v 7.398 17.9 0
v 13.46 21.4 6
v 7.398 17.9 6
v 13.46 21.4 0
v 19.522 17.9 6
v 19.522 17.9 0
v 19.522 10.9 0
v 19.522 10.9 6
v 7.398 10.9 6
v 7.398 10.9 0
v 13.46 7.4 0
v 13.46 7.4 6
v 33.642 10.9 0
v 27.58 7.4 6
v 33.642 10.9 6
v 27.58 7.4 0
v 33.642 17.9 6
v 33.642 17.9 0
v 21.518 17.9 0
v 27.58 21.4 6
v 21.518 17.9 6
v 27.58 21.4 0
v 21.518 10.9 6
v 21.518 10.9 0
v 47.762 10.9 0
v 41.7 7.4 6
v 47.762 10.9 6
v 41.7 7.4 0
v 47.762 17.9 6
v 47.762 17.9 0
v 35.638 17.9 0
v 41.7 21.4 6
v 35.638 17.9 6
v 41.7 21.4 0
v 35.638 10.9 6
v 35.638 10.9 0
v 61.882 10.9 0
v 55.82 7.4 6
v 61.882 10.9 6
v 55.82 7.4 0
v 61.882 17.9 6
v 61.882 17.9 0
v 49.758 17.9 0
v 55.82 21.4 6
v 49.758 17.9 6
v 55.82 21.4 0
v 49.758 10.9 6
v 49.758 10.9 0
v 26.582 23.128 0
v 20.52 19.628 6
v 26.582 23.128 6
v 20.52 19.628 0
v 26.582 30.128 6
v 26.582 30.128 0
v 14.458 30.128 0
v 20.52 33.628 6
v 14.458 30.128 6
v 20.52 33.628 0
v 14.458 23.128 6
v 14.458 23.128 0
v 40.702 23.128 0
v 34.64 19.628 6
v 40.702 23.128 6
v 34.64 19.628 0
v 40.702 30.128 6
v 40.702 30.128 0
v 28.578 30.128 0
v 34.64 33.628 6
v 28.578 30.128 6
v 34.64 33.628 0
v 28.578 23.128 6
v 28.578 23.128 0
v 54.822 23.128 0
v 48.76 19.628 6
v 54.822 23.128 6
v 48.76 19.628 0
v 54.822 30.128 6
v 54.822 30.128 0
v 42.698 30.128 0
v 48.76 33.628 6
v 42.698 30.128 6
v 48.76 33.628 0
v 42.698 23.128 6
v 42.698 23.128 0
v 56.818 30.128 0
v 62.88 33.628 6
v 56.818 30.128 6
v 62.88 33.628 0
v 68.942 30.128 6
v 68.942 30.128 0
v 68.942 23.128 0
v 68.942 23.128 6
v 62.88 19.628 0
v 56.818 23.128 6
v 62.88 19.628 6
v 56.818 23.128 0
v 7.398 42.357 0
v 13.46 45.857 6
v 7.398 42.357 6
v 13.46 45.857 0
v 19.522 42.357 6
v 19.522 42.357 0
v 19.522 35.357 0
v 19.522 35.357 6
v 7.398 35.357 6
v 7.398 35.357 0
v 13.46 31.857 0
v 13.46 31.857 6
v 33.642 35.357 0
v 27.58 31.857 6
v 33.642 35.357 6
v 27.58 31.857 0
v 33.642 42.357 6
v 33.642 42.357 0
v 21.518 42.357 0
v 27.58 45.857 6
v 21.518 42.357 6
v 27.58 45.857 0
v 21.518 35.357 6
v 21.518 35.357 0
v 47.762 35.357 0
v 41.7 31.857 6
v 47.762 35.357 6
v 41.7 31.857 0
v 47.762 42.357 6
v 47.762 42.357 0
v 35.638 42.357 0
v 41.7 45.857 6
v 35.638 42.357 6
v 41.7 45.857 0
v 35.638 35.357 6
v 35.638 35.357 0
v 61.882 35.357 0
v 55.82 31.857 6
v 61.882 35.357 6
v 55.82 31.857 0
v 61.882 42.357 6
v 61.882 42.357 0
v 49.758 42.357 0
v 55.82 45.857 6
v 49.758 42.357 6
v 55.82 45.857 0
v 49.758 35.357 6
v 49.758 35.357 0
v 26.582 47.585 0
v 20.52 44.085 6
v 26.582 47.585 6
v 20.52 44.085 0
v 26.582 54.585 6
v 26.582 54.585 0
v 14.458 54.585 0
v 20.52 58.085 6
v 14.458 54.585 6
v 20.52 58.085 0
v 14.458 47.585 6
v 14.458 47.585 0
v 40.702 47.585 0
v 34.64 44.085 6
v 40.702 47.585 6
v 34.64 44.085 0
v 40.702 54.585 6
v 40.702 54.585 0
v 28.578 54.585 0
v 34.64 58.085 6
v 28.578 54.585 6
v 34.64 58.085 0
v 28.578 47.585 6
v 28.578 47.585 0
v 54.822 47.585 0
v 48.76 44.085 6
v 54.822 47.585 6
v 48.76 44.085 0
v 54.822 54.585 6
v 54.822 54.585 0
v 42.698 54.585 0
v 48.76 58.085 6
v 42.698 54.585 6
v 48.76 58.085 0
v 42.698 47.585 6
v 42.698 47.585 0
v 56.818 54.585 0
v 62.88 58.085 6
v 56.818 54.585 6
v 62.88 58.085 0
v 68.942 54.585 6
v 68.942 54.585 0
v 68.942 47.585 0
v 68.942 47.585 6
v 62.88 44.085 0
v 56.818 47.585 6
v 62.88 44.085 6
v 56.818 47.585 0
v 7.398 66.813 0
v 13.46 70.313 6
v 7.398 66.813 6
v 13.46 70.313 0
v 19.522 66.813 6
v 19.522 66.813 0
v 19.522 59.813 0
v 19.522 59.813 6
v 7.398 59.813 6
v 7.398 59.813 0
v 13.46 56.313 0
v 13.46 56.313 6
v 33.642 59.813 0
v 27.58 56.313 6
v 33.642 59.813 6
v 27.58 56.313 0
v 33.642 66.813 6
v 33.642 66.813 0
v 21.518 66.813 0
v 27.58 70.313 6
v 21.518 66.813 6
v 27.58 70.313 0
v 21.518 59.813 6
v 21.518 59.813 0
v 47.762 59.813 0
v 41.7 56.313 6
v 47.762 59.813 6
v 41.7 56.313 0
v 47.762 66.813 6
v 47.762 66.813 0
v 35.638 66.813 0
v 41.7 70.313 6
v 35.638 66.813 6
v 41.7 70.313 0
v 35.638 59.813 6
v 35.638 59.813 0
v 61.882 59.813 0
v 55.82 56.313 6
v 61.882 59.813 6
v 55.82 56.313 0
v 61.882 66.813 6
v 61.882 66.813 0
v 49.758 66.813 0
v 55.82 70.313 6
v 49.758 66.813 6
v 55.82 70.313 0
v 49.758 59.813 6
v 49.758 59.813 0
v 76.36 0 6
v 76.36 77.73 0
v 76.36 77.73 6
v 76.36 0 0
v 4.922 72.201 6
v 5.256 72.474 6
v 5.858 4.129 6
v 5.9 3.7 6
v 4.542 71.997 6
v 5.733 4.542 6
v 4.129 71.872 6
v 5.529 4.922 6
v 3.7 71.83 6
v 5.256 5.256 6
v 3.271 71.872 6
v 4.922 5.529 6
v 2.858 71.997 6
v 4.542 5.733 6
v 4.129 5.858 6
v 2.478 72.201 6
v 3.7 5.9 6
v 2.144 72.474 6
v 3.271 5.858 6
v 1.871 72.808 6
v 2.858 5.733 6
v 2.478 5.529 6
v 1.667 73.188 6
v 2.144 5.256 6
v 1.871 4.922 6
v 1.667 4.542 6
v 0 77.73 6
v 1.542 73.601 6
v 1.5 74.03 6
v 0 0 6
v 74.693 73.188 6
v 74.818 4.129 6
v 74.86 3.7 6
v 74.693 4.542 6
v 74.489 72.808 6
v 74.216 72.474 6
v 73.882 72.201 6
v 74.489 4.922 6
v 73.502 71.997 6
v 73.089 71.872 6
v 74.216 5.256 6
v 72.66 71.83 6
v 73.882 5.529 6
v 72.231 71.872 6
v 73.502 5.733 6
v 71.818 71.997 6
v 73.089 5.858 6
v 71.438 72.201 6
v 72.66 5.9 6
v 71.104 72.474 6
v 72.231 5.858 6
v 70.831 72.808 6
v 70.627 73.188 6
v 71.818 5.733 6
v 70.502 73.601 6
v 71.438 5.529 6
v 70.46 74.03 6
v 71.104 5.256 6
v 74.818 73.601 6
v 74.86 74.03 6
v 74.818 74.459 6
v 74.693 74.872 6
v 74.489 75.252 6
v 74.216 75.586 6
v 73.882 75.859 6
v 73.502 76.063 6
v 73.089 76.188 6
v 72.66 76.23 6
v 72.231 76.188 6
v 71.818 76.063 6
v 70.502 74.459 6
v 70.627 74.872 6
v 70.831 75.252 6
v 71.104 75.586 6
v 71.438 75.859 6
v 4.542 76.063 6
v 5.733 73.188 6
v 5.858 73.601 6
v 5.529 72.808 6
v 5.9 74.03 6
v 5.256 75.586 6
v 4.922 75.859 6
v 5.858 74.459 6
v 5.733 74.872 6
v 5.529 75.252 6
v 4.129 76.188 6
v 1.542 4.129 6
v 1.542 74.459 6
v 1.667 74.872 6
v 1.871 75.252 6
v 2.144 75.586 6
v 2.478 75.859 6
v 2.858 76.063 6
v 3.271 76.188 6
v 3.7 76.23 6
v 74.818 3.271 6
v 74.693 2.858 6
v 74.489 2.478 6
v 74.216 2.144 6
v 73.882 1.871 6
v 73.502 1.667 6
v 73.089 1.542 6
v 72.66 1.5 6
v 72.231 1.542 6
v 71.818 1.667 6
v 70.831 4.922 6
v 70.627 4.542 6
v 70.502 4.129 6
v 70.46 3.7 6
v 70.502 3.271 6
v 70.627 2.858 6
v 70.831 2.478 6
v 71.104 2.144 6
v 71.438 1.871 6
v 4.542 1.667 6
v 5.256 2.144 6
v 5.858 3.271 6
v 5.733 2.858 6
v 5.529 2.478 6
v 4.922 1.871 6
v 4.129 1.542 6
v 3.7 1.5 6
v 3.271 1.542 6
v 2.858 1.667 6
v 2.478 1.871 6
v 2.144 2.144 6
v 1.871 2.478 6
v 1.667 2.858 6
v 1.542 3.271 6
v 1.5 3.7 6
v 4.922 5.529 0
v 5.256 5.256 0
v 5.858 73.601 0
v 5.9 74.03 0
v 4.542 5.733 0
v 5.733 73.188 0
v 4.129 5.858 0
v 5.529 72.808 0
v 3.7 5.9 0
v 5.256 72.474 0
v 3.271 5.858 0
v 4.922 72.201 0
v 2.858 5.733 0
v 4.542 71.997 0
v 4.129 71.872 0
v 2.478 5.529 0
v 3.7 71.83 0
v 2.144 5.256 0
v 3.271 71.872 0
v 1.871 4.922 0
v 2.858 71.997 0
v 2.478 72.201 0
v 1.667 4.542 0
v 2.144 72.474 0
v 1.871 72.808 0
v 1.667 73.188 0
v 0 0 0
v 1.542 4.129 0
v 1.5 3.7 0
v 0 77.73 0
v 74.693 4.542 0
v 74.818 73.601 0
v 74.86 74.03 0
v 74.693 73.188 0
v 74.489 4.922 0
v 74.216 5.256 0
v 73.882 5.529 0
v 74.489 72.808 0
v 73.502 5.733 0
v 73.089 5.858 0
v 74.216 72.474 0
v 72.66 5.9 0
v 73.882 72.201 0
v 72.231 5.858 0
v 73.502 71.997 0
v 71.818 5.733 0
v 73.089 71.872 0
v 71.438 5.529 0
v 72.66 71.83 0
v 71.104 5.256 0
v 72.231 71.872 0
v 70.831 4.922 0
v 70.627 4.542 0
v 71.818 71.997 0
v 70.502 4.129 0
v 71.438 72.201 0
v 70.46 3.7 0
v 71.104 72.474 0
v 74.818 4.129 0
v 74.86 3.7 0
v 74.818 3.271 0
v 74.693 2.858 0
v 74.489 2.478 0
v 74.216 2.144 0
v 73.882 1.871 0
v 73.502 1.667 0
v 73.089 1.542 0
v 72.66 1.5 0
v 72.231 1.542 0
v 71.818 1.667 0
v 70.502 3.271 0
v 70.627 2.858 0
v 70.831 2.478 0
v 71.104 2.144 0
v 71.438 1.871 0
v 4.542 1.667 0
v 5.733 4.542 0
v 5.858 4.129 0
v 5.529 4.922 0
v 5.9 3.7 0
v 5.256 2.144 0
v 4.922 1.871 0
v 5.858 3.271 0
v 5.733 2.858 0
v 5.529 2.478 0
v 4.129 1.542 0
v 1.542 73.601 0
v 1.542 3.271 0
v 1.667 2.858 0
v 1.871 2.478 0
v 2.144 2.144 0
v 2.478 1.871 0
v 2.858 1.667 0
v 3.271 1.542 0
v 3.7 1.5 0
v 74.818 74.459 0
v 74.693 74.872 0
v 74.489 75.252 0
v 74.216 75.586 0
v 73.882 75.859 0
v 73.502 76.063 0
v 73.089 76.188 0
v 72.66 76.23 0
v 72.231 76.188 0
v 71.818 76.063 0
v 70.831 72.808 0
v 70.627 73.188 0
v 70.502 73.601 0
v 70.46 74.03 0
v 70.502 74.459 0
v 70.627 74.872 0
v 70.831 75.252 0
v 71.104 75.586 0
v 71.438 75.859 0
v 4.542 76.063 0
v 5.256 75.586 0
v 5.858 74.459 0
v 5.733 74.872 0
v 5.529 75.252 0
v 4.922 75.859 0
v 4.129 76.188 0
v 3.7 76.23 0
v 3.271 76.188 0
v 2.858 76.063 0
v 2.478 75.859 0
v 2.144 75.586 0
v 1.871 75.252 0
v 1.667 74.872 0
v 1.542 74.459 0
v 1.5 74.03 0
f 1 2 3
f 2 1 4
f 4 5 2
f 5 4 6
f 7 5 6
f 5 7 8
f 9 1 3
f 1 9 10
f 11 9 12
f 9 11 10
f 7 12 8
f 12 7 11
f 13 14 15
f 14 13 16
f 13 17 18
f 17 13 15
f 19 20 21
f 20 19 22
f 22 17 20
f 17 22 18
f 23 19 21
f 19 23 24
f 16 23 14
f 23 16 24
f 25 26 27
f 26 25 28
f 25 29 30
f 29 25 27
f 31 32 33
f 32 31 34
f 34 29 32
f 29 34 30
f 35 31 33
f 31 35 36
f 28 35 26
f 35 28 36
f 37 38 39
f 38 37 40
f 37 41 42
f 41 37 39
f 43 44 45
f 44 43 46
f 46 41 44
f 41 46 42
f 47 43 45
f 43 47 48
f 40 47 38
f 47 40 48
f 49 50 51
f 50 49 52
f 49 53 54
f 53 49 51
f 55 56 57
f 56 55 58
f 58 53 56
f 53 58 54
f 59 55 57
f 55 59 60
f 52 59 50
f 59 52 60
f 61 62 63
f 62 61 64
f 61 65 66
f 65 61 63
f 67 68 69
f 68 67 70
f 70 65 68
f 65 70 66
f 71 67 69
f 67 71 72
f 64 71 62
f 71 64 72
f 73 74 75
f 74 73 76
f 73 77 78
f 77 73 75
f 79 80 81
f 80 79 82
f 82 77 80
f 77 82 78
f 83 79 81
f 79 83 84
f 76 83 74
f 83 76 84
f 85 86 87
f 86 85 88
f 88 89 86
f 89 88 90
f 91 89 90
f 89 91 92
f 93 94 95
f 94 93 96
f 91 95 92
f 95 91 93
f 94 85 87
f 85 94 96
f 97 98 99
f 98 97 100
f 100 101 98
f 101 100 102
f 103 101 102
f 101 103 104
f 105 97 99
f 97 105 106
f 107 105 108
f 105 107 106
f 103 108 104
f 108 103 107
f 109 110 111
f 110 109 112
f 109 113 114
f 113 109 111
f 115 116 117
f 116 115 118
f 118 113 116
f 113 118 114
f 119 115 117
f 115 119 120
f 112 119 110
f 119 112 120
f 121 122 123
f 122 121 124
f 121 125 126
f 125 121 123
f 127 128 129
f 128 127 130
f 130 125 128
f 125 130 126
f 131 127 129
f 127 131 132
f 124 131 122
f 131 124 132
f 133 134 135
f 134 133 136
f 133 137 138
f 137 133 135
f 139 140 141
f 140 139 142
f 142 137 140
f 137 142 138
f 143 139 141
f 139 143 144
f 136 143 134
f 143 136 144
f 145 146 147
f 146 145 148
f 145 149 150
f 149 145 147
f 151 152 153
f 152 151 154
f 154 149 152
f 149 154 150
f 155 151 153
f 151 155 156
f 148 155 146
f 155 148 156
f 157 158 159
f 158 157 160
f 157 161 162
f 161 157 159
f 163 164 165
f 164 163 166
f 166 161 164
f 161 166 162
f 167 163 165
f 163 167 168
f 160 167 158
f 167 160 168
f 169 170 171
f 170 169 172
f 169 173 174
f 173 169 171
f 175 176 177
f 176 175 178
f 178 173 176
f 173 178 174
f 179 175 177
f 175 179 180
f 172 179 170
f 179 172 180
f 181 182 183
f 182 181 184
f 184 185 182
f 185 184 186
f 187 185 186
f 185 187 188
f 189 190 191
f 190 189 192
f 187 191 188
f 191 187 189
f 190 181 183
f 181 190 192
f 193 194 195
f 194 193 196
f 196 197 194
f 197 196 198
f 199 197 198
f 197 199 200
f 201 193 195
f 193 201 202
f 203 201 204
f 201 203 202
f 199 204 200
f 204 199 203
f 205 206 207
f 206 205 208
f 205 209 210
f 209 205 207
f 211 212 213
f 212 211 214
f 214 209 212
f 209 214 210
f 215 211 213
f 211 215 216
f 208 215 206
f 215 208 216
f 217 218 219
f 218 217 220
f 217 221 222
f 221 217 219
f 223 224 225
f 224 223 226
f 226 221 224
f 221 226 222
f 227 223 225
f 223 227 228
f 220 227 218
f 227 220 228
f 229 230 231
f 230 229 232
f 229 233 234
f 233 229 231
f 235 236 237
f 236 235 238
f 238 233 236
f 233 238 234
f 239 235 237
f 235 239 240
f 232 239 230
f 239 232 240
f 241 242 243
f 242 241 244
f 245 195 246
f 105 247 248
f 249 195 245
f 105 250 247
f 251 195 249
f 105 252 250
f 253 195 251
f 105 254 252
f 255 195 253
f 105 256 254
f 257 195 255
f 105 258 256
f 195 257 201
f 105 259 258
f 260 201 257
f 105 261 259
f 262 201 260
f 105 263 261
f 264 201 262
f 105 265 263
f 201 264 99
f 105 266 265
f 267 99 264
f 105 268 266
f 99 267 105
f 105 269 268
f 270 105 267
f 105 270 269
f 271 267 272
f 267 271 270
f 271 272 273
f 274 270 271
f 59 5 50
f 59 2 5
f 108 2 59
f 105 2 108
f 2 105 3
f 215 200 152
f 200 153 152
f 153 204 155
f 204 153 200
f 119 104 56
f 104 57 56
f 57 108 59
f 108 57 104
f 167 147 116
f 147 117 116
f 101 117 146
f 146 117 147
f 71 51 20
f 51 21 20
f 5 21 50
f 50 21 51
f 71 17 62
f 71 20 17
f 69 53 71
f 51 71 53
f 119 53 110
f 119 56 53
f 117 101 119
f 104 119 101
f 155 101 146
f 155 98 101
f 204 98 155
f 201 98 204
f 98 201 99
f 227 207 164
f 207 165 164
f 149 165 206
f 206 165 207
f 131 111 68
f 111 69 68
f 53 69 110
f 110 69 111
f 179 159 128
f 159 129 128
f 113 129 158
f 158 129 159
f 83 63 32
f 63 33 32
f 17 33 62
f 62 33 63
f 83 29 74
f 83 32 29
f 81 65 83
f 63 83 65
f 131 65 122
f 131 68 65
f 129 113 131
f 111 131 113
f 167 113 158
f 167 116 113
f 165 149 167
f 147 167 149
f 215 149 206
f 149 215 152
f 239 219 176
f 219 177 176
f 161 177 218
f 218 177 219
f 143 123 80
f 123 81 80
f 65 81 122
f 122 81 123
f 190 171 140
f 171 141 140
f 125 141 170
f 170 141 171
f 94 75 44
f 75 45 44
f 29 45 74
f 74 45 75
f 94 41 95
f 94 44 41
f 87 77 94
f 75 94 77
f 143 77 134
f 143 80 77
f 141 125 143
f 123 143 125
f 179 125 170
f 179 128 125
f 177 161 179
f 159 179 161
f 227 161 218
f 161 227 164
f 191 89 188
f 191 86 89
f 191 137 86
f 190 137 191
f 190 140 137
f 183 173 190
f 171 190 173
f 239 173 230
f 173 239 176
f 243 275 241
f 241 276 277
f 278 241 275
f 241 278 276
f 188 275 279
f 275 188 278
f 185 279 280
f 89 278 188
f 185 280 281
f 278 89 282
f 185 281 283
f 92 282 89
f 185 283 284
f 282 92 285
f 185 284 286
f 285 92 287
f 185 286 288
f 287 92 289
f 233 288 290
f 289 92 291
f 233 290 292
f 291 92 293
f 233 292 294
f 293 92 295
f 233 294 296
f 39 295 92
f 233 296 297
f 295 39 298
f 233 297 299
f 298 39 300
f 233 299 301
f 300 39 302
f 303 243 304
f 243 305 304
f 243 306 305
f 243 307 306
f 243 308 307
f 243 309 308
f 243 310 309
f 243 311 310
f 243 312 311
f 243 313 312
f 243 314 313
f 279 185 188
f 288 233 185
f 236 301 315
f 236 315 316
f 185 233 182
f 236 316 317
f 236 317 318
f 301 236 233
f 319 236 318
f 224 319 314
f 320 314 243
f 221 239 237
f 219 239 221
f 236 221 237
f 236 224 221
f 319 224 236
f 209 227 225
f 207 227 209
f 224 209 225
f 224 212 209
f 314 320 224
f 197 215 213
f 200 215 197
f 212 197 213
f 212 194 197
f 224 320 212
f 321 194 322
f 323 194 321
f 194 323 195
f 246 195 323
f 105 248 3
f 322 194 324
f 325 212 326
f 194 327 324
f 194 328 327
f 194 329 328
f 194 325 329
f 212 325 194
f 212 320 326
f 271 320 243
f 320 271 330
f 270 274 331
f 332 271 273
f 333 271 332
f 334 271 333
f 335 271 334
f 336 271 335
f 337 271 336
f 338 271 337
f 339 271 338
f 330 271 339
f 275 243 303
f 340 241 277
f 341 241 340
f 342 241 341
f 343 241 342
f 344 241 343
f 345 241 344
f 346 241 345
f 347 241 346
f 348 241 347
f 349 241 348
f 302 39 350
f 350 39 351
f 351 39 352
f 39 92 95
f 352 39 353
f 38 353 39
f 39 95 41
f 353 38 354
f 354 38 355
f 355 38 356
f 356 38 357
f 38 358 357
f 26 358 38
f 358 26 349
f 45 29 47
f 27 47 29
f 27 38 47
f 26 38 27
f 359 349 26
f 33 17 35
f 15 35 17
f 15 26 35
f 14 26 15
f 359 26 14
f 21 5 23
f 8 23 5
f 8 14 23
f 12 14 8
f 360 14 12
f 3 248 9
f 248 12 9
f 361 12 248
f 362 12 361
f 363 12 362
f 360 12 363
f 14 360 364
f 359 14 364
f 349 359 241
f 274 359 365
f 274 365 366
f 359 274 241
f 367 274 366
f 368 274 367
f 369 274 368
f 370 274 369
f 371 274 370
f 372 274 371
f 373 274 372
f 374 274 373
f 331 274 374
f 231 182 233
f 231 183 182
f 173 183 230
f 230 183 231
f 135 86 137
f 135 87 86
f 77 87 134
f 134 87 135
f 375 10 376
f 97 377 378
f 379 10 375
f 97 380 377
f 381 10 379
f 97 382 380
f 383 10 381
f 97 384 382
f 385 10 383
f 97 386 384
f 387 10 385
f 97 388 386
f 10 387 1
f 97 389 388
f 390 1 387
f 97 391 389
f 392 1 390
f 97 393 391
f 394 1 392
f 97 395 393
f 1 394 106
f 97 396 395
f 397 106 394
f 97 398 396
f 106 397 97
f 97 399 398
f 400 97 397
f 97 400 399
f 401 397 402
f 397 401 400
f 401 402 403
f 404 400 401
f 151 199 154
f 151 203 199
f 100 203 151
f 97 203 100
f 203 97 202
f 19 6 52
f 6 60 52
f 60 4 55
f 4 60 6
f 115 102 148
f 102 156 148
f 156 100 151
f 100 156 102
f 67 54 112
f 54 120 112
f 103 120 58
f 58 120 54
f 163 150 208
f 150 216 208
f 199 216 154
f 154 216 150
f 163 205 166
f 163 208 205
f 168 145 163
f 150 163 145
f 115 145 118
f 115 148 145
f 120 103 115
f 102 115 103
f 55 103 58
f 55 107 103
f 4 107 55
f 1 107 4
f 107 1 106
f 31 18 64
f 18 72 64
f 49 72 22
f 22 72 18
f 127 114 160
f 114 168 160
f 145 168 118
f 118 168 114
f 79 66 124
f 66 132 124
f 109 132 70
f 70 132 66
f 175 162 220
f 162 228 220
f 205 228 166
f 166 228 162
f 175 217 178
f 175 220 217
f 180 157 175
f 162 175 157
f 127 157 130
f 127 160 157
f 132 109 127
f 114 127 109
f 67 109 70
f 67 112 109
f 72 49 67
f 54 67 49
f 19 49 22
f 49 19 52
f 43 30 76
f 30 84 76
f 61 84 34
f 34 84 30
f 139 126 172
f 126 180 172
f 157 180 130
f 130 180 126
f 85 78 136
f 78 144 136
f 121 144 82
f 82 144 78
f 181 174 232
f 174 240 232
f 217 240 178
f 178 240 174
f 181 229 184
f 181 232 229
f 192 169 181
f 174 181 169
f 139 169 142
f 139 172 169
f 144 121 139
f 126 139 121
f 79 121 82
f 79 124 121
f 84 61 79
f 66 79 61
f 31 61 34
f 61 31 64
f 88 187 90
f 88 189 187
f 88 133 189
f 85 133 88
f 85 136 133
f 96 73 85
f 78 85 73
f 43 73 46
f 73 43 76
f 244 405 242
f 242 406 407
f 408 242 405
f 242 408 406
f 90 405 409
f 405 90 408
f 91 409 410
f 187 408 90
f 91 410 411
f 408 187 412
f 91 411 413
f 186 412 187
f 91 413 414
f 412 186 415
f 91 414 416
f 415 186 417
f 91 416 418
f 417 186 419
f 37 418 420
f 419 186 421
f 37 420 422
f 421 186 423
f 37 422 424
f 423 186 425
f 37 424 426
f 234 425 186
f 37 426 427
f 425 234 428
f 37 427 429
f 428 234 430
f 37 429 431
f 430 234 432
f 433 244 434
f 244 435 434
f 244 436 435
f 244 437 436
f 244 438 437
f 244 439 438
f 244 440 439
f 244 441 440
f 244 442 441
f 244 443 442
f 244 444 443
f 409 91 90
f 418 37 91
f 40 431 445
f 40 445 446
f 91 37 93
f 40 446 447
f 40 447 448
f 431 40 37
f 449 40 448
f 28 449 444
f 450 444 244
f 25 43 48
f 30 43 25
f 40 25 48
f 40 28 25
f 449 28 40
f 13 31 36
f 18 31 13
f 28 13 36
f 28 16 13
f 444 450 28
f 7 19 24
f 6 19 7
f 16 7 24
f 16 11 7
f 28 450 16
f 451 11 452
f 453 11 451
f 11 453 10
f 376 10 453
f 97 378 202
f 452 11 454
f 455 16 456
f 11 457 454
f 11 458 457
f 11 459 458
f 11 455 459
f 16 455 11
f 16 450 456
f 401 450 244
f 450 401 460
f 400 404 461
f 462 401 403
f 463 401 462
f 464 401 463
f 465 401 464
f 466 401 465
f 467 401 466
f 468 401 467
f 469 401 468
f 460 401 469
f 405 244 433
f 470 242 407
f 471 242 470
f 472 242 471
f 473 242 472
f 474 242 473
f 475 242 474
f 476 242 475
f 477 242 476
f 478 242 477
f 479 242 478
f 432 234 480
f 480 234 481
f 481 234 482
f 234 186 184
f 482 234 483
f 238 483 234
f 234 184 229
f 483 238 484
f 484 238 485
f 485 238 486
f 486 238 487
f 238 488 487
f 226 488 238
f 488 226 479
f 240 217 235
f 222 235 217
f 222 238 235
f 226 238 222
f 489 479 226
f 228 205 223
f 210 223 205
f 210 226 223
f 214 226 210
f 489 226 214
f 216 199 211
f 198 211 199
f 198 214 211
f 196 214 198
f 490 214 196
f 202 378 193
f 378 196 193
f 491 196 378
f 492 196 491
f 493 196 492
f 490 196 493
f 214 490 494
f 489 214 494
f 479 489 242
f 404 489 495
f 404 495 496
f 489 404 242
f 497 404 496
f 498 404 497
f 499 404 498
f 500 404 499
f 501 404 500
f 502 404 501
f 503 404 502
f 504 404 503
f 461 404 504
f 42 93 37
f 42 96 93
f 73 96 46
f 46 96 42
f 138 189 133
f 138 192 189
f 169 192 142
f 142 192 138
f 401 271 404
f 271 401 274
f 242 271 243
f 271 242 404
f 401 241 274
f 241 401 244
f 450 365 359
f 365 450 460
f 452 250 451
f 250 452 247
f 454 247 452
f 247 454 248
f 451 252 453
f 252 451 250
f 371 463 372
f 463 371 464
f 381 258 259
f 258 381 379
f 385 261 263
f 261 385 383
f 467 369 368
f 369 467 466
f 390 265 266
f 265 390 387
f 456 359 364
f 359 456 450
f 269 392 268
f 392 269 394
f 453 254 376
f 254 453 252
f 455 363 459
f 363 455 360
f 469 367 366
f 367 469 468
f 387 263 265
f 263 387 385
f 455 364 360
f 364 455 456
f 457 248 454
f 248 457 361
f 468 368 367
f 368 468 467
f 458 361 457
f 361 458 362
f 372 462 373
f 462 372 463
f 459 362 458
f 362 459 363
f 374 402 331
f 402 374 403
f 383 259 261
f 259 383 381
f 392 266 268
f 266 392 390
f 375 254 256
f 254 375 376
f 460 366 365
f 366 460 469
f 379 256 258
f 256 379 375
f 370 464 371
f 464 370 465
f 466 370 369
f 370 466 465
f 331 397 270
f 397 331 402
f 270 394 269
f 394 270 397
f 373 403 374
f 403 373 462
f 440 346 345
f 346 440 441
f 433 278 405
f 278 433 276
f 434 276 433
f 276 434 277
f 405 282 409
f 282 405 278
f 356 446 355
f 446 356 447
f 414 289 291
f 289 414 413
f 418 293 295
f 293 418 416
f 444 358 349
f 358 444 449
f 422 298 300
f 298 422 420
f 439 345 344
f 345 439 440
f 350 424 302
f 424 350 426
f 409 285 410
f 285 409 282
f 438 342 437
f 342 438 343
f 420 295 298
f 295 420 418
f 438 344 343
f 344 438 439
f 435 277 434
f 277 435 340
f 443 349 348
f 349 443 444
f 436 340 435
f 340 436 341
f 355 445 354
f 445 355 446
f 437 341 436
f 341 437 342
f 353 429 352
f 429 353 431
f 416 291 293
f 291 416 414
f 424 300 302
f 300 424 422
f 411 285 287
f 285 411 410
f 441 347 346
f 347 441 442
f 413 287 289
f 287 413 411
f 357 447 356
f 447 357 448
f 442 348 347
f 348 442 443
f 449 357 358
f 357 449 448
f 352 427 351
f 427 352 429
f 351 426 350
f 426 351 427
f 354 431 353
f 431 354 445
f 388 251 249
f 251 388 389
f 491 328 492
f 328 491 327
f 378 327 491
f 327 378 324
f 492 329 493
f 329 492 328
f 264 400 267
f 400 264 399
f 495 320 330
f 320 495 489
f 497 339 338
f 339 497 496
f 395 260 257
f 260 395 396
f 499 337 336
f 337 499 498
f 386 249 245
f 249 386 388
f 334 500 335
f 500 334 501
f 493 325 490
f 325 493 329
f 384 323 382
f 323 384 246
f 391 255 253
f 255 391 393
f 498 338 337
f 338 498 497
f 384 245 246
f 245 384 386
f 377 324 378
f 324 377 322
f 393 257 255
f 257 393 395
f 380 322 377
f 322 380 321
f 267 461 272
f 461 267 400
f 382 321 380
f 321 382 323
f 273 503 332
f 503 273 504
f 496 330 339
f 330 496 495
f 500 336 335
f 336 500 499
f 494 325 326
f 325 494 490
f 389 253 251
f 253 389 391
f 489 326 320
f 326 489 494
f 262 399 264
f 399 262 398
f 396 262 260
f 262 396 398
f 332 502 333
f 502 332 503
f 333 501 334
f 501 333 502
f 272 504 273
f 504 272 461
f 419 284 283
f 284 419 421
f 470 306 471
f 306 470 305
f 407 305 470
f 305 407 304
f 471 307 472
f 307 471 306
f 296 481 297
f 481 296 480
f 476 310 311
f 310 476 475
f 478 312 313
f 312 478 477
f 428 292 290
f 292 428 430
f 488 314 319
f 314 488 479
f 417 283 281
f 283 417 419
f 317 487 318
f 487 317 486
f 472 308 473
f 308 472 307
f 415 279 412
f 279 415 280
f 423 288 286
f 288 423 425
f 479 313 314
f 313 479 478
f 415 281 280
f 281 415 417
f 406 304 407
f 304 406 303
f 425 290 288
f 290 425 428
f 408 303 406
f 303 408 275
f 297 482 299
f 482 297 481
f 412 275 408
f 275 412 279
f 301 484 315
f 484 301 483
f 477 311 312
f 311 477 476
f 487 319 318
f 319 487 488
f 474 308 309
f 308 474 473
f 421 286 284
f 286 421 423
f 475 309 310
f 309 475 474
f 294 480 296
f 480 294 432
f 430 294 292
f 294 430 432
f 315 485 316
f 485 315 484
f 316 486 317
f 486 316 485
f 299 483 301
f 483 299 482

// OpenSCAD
$fn = 32;

// ----------------------------------------------------------------------
// Honeycomb panel: 76.36 x 77.73 mm, 20 cells of 14 mm
// ----------------------------------------------------------------------

// --- parameters (mm) ---
panel_w = 76.36;          // panel width
panel_d = 77.73;          // panel depth
thick = 6;                // panel thickness
cell_r = 7;               // hex cell circumradius
pitch = 14.12;            // hex cell pitch (centre to centre)
web = 2;                  // web between the cells
columns = 4;              // columns of cells
rows = 5;                 // rows of cells
cell_count = 20;          // total cells
shift_x = 13.46;          // first cell offset in x
shift_y = 14.4;           // first cell offset in y
mount_d = 4.4;            // corner mounting holes
hole_off = 3.7;           // mounting hole offset from the corners

difference() {
  union() {
    cube([panel_w, panel_d, thick]);
  }
  /* hexagonal cells, point-up, cut right through the plate */
  for (row = [0 : rows - 1]) {
    for (col = [0 : columns - 1]) {
      translate([shift_x + col * pitch + (row % 2) * pitch / 2, shift_y + row * pitch * 0.866025, -2.5]) rotate([0, 0, 30]) cylinder(h = thick + 5, d = 2 * cell_r, $fn = 6);
    }
  }
  /* corner mounting holes, clear of the outer cell web */
  translate([3.7, 3.7, -2.5]) cylinder(h = thick + 5, d = mount_d);
  translate([72.66, 3.7, -2.5]) cylinder(h = thick + 5, d = mount_d);
  translate([3.7, 74.03, -2.5]) cylinder(h = thick + 5, d = mount_d);
  translate([72.66, 74.03, -2.5]) cylinder(h = thick + 5, d = mount_d);
}
